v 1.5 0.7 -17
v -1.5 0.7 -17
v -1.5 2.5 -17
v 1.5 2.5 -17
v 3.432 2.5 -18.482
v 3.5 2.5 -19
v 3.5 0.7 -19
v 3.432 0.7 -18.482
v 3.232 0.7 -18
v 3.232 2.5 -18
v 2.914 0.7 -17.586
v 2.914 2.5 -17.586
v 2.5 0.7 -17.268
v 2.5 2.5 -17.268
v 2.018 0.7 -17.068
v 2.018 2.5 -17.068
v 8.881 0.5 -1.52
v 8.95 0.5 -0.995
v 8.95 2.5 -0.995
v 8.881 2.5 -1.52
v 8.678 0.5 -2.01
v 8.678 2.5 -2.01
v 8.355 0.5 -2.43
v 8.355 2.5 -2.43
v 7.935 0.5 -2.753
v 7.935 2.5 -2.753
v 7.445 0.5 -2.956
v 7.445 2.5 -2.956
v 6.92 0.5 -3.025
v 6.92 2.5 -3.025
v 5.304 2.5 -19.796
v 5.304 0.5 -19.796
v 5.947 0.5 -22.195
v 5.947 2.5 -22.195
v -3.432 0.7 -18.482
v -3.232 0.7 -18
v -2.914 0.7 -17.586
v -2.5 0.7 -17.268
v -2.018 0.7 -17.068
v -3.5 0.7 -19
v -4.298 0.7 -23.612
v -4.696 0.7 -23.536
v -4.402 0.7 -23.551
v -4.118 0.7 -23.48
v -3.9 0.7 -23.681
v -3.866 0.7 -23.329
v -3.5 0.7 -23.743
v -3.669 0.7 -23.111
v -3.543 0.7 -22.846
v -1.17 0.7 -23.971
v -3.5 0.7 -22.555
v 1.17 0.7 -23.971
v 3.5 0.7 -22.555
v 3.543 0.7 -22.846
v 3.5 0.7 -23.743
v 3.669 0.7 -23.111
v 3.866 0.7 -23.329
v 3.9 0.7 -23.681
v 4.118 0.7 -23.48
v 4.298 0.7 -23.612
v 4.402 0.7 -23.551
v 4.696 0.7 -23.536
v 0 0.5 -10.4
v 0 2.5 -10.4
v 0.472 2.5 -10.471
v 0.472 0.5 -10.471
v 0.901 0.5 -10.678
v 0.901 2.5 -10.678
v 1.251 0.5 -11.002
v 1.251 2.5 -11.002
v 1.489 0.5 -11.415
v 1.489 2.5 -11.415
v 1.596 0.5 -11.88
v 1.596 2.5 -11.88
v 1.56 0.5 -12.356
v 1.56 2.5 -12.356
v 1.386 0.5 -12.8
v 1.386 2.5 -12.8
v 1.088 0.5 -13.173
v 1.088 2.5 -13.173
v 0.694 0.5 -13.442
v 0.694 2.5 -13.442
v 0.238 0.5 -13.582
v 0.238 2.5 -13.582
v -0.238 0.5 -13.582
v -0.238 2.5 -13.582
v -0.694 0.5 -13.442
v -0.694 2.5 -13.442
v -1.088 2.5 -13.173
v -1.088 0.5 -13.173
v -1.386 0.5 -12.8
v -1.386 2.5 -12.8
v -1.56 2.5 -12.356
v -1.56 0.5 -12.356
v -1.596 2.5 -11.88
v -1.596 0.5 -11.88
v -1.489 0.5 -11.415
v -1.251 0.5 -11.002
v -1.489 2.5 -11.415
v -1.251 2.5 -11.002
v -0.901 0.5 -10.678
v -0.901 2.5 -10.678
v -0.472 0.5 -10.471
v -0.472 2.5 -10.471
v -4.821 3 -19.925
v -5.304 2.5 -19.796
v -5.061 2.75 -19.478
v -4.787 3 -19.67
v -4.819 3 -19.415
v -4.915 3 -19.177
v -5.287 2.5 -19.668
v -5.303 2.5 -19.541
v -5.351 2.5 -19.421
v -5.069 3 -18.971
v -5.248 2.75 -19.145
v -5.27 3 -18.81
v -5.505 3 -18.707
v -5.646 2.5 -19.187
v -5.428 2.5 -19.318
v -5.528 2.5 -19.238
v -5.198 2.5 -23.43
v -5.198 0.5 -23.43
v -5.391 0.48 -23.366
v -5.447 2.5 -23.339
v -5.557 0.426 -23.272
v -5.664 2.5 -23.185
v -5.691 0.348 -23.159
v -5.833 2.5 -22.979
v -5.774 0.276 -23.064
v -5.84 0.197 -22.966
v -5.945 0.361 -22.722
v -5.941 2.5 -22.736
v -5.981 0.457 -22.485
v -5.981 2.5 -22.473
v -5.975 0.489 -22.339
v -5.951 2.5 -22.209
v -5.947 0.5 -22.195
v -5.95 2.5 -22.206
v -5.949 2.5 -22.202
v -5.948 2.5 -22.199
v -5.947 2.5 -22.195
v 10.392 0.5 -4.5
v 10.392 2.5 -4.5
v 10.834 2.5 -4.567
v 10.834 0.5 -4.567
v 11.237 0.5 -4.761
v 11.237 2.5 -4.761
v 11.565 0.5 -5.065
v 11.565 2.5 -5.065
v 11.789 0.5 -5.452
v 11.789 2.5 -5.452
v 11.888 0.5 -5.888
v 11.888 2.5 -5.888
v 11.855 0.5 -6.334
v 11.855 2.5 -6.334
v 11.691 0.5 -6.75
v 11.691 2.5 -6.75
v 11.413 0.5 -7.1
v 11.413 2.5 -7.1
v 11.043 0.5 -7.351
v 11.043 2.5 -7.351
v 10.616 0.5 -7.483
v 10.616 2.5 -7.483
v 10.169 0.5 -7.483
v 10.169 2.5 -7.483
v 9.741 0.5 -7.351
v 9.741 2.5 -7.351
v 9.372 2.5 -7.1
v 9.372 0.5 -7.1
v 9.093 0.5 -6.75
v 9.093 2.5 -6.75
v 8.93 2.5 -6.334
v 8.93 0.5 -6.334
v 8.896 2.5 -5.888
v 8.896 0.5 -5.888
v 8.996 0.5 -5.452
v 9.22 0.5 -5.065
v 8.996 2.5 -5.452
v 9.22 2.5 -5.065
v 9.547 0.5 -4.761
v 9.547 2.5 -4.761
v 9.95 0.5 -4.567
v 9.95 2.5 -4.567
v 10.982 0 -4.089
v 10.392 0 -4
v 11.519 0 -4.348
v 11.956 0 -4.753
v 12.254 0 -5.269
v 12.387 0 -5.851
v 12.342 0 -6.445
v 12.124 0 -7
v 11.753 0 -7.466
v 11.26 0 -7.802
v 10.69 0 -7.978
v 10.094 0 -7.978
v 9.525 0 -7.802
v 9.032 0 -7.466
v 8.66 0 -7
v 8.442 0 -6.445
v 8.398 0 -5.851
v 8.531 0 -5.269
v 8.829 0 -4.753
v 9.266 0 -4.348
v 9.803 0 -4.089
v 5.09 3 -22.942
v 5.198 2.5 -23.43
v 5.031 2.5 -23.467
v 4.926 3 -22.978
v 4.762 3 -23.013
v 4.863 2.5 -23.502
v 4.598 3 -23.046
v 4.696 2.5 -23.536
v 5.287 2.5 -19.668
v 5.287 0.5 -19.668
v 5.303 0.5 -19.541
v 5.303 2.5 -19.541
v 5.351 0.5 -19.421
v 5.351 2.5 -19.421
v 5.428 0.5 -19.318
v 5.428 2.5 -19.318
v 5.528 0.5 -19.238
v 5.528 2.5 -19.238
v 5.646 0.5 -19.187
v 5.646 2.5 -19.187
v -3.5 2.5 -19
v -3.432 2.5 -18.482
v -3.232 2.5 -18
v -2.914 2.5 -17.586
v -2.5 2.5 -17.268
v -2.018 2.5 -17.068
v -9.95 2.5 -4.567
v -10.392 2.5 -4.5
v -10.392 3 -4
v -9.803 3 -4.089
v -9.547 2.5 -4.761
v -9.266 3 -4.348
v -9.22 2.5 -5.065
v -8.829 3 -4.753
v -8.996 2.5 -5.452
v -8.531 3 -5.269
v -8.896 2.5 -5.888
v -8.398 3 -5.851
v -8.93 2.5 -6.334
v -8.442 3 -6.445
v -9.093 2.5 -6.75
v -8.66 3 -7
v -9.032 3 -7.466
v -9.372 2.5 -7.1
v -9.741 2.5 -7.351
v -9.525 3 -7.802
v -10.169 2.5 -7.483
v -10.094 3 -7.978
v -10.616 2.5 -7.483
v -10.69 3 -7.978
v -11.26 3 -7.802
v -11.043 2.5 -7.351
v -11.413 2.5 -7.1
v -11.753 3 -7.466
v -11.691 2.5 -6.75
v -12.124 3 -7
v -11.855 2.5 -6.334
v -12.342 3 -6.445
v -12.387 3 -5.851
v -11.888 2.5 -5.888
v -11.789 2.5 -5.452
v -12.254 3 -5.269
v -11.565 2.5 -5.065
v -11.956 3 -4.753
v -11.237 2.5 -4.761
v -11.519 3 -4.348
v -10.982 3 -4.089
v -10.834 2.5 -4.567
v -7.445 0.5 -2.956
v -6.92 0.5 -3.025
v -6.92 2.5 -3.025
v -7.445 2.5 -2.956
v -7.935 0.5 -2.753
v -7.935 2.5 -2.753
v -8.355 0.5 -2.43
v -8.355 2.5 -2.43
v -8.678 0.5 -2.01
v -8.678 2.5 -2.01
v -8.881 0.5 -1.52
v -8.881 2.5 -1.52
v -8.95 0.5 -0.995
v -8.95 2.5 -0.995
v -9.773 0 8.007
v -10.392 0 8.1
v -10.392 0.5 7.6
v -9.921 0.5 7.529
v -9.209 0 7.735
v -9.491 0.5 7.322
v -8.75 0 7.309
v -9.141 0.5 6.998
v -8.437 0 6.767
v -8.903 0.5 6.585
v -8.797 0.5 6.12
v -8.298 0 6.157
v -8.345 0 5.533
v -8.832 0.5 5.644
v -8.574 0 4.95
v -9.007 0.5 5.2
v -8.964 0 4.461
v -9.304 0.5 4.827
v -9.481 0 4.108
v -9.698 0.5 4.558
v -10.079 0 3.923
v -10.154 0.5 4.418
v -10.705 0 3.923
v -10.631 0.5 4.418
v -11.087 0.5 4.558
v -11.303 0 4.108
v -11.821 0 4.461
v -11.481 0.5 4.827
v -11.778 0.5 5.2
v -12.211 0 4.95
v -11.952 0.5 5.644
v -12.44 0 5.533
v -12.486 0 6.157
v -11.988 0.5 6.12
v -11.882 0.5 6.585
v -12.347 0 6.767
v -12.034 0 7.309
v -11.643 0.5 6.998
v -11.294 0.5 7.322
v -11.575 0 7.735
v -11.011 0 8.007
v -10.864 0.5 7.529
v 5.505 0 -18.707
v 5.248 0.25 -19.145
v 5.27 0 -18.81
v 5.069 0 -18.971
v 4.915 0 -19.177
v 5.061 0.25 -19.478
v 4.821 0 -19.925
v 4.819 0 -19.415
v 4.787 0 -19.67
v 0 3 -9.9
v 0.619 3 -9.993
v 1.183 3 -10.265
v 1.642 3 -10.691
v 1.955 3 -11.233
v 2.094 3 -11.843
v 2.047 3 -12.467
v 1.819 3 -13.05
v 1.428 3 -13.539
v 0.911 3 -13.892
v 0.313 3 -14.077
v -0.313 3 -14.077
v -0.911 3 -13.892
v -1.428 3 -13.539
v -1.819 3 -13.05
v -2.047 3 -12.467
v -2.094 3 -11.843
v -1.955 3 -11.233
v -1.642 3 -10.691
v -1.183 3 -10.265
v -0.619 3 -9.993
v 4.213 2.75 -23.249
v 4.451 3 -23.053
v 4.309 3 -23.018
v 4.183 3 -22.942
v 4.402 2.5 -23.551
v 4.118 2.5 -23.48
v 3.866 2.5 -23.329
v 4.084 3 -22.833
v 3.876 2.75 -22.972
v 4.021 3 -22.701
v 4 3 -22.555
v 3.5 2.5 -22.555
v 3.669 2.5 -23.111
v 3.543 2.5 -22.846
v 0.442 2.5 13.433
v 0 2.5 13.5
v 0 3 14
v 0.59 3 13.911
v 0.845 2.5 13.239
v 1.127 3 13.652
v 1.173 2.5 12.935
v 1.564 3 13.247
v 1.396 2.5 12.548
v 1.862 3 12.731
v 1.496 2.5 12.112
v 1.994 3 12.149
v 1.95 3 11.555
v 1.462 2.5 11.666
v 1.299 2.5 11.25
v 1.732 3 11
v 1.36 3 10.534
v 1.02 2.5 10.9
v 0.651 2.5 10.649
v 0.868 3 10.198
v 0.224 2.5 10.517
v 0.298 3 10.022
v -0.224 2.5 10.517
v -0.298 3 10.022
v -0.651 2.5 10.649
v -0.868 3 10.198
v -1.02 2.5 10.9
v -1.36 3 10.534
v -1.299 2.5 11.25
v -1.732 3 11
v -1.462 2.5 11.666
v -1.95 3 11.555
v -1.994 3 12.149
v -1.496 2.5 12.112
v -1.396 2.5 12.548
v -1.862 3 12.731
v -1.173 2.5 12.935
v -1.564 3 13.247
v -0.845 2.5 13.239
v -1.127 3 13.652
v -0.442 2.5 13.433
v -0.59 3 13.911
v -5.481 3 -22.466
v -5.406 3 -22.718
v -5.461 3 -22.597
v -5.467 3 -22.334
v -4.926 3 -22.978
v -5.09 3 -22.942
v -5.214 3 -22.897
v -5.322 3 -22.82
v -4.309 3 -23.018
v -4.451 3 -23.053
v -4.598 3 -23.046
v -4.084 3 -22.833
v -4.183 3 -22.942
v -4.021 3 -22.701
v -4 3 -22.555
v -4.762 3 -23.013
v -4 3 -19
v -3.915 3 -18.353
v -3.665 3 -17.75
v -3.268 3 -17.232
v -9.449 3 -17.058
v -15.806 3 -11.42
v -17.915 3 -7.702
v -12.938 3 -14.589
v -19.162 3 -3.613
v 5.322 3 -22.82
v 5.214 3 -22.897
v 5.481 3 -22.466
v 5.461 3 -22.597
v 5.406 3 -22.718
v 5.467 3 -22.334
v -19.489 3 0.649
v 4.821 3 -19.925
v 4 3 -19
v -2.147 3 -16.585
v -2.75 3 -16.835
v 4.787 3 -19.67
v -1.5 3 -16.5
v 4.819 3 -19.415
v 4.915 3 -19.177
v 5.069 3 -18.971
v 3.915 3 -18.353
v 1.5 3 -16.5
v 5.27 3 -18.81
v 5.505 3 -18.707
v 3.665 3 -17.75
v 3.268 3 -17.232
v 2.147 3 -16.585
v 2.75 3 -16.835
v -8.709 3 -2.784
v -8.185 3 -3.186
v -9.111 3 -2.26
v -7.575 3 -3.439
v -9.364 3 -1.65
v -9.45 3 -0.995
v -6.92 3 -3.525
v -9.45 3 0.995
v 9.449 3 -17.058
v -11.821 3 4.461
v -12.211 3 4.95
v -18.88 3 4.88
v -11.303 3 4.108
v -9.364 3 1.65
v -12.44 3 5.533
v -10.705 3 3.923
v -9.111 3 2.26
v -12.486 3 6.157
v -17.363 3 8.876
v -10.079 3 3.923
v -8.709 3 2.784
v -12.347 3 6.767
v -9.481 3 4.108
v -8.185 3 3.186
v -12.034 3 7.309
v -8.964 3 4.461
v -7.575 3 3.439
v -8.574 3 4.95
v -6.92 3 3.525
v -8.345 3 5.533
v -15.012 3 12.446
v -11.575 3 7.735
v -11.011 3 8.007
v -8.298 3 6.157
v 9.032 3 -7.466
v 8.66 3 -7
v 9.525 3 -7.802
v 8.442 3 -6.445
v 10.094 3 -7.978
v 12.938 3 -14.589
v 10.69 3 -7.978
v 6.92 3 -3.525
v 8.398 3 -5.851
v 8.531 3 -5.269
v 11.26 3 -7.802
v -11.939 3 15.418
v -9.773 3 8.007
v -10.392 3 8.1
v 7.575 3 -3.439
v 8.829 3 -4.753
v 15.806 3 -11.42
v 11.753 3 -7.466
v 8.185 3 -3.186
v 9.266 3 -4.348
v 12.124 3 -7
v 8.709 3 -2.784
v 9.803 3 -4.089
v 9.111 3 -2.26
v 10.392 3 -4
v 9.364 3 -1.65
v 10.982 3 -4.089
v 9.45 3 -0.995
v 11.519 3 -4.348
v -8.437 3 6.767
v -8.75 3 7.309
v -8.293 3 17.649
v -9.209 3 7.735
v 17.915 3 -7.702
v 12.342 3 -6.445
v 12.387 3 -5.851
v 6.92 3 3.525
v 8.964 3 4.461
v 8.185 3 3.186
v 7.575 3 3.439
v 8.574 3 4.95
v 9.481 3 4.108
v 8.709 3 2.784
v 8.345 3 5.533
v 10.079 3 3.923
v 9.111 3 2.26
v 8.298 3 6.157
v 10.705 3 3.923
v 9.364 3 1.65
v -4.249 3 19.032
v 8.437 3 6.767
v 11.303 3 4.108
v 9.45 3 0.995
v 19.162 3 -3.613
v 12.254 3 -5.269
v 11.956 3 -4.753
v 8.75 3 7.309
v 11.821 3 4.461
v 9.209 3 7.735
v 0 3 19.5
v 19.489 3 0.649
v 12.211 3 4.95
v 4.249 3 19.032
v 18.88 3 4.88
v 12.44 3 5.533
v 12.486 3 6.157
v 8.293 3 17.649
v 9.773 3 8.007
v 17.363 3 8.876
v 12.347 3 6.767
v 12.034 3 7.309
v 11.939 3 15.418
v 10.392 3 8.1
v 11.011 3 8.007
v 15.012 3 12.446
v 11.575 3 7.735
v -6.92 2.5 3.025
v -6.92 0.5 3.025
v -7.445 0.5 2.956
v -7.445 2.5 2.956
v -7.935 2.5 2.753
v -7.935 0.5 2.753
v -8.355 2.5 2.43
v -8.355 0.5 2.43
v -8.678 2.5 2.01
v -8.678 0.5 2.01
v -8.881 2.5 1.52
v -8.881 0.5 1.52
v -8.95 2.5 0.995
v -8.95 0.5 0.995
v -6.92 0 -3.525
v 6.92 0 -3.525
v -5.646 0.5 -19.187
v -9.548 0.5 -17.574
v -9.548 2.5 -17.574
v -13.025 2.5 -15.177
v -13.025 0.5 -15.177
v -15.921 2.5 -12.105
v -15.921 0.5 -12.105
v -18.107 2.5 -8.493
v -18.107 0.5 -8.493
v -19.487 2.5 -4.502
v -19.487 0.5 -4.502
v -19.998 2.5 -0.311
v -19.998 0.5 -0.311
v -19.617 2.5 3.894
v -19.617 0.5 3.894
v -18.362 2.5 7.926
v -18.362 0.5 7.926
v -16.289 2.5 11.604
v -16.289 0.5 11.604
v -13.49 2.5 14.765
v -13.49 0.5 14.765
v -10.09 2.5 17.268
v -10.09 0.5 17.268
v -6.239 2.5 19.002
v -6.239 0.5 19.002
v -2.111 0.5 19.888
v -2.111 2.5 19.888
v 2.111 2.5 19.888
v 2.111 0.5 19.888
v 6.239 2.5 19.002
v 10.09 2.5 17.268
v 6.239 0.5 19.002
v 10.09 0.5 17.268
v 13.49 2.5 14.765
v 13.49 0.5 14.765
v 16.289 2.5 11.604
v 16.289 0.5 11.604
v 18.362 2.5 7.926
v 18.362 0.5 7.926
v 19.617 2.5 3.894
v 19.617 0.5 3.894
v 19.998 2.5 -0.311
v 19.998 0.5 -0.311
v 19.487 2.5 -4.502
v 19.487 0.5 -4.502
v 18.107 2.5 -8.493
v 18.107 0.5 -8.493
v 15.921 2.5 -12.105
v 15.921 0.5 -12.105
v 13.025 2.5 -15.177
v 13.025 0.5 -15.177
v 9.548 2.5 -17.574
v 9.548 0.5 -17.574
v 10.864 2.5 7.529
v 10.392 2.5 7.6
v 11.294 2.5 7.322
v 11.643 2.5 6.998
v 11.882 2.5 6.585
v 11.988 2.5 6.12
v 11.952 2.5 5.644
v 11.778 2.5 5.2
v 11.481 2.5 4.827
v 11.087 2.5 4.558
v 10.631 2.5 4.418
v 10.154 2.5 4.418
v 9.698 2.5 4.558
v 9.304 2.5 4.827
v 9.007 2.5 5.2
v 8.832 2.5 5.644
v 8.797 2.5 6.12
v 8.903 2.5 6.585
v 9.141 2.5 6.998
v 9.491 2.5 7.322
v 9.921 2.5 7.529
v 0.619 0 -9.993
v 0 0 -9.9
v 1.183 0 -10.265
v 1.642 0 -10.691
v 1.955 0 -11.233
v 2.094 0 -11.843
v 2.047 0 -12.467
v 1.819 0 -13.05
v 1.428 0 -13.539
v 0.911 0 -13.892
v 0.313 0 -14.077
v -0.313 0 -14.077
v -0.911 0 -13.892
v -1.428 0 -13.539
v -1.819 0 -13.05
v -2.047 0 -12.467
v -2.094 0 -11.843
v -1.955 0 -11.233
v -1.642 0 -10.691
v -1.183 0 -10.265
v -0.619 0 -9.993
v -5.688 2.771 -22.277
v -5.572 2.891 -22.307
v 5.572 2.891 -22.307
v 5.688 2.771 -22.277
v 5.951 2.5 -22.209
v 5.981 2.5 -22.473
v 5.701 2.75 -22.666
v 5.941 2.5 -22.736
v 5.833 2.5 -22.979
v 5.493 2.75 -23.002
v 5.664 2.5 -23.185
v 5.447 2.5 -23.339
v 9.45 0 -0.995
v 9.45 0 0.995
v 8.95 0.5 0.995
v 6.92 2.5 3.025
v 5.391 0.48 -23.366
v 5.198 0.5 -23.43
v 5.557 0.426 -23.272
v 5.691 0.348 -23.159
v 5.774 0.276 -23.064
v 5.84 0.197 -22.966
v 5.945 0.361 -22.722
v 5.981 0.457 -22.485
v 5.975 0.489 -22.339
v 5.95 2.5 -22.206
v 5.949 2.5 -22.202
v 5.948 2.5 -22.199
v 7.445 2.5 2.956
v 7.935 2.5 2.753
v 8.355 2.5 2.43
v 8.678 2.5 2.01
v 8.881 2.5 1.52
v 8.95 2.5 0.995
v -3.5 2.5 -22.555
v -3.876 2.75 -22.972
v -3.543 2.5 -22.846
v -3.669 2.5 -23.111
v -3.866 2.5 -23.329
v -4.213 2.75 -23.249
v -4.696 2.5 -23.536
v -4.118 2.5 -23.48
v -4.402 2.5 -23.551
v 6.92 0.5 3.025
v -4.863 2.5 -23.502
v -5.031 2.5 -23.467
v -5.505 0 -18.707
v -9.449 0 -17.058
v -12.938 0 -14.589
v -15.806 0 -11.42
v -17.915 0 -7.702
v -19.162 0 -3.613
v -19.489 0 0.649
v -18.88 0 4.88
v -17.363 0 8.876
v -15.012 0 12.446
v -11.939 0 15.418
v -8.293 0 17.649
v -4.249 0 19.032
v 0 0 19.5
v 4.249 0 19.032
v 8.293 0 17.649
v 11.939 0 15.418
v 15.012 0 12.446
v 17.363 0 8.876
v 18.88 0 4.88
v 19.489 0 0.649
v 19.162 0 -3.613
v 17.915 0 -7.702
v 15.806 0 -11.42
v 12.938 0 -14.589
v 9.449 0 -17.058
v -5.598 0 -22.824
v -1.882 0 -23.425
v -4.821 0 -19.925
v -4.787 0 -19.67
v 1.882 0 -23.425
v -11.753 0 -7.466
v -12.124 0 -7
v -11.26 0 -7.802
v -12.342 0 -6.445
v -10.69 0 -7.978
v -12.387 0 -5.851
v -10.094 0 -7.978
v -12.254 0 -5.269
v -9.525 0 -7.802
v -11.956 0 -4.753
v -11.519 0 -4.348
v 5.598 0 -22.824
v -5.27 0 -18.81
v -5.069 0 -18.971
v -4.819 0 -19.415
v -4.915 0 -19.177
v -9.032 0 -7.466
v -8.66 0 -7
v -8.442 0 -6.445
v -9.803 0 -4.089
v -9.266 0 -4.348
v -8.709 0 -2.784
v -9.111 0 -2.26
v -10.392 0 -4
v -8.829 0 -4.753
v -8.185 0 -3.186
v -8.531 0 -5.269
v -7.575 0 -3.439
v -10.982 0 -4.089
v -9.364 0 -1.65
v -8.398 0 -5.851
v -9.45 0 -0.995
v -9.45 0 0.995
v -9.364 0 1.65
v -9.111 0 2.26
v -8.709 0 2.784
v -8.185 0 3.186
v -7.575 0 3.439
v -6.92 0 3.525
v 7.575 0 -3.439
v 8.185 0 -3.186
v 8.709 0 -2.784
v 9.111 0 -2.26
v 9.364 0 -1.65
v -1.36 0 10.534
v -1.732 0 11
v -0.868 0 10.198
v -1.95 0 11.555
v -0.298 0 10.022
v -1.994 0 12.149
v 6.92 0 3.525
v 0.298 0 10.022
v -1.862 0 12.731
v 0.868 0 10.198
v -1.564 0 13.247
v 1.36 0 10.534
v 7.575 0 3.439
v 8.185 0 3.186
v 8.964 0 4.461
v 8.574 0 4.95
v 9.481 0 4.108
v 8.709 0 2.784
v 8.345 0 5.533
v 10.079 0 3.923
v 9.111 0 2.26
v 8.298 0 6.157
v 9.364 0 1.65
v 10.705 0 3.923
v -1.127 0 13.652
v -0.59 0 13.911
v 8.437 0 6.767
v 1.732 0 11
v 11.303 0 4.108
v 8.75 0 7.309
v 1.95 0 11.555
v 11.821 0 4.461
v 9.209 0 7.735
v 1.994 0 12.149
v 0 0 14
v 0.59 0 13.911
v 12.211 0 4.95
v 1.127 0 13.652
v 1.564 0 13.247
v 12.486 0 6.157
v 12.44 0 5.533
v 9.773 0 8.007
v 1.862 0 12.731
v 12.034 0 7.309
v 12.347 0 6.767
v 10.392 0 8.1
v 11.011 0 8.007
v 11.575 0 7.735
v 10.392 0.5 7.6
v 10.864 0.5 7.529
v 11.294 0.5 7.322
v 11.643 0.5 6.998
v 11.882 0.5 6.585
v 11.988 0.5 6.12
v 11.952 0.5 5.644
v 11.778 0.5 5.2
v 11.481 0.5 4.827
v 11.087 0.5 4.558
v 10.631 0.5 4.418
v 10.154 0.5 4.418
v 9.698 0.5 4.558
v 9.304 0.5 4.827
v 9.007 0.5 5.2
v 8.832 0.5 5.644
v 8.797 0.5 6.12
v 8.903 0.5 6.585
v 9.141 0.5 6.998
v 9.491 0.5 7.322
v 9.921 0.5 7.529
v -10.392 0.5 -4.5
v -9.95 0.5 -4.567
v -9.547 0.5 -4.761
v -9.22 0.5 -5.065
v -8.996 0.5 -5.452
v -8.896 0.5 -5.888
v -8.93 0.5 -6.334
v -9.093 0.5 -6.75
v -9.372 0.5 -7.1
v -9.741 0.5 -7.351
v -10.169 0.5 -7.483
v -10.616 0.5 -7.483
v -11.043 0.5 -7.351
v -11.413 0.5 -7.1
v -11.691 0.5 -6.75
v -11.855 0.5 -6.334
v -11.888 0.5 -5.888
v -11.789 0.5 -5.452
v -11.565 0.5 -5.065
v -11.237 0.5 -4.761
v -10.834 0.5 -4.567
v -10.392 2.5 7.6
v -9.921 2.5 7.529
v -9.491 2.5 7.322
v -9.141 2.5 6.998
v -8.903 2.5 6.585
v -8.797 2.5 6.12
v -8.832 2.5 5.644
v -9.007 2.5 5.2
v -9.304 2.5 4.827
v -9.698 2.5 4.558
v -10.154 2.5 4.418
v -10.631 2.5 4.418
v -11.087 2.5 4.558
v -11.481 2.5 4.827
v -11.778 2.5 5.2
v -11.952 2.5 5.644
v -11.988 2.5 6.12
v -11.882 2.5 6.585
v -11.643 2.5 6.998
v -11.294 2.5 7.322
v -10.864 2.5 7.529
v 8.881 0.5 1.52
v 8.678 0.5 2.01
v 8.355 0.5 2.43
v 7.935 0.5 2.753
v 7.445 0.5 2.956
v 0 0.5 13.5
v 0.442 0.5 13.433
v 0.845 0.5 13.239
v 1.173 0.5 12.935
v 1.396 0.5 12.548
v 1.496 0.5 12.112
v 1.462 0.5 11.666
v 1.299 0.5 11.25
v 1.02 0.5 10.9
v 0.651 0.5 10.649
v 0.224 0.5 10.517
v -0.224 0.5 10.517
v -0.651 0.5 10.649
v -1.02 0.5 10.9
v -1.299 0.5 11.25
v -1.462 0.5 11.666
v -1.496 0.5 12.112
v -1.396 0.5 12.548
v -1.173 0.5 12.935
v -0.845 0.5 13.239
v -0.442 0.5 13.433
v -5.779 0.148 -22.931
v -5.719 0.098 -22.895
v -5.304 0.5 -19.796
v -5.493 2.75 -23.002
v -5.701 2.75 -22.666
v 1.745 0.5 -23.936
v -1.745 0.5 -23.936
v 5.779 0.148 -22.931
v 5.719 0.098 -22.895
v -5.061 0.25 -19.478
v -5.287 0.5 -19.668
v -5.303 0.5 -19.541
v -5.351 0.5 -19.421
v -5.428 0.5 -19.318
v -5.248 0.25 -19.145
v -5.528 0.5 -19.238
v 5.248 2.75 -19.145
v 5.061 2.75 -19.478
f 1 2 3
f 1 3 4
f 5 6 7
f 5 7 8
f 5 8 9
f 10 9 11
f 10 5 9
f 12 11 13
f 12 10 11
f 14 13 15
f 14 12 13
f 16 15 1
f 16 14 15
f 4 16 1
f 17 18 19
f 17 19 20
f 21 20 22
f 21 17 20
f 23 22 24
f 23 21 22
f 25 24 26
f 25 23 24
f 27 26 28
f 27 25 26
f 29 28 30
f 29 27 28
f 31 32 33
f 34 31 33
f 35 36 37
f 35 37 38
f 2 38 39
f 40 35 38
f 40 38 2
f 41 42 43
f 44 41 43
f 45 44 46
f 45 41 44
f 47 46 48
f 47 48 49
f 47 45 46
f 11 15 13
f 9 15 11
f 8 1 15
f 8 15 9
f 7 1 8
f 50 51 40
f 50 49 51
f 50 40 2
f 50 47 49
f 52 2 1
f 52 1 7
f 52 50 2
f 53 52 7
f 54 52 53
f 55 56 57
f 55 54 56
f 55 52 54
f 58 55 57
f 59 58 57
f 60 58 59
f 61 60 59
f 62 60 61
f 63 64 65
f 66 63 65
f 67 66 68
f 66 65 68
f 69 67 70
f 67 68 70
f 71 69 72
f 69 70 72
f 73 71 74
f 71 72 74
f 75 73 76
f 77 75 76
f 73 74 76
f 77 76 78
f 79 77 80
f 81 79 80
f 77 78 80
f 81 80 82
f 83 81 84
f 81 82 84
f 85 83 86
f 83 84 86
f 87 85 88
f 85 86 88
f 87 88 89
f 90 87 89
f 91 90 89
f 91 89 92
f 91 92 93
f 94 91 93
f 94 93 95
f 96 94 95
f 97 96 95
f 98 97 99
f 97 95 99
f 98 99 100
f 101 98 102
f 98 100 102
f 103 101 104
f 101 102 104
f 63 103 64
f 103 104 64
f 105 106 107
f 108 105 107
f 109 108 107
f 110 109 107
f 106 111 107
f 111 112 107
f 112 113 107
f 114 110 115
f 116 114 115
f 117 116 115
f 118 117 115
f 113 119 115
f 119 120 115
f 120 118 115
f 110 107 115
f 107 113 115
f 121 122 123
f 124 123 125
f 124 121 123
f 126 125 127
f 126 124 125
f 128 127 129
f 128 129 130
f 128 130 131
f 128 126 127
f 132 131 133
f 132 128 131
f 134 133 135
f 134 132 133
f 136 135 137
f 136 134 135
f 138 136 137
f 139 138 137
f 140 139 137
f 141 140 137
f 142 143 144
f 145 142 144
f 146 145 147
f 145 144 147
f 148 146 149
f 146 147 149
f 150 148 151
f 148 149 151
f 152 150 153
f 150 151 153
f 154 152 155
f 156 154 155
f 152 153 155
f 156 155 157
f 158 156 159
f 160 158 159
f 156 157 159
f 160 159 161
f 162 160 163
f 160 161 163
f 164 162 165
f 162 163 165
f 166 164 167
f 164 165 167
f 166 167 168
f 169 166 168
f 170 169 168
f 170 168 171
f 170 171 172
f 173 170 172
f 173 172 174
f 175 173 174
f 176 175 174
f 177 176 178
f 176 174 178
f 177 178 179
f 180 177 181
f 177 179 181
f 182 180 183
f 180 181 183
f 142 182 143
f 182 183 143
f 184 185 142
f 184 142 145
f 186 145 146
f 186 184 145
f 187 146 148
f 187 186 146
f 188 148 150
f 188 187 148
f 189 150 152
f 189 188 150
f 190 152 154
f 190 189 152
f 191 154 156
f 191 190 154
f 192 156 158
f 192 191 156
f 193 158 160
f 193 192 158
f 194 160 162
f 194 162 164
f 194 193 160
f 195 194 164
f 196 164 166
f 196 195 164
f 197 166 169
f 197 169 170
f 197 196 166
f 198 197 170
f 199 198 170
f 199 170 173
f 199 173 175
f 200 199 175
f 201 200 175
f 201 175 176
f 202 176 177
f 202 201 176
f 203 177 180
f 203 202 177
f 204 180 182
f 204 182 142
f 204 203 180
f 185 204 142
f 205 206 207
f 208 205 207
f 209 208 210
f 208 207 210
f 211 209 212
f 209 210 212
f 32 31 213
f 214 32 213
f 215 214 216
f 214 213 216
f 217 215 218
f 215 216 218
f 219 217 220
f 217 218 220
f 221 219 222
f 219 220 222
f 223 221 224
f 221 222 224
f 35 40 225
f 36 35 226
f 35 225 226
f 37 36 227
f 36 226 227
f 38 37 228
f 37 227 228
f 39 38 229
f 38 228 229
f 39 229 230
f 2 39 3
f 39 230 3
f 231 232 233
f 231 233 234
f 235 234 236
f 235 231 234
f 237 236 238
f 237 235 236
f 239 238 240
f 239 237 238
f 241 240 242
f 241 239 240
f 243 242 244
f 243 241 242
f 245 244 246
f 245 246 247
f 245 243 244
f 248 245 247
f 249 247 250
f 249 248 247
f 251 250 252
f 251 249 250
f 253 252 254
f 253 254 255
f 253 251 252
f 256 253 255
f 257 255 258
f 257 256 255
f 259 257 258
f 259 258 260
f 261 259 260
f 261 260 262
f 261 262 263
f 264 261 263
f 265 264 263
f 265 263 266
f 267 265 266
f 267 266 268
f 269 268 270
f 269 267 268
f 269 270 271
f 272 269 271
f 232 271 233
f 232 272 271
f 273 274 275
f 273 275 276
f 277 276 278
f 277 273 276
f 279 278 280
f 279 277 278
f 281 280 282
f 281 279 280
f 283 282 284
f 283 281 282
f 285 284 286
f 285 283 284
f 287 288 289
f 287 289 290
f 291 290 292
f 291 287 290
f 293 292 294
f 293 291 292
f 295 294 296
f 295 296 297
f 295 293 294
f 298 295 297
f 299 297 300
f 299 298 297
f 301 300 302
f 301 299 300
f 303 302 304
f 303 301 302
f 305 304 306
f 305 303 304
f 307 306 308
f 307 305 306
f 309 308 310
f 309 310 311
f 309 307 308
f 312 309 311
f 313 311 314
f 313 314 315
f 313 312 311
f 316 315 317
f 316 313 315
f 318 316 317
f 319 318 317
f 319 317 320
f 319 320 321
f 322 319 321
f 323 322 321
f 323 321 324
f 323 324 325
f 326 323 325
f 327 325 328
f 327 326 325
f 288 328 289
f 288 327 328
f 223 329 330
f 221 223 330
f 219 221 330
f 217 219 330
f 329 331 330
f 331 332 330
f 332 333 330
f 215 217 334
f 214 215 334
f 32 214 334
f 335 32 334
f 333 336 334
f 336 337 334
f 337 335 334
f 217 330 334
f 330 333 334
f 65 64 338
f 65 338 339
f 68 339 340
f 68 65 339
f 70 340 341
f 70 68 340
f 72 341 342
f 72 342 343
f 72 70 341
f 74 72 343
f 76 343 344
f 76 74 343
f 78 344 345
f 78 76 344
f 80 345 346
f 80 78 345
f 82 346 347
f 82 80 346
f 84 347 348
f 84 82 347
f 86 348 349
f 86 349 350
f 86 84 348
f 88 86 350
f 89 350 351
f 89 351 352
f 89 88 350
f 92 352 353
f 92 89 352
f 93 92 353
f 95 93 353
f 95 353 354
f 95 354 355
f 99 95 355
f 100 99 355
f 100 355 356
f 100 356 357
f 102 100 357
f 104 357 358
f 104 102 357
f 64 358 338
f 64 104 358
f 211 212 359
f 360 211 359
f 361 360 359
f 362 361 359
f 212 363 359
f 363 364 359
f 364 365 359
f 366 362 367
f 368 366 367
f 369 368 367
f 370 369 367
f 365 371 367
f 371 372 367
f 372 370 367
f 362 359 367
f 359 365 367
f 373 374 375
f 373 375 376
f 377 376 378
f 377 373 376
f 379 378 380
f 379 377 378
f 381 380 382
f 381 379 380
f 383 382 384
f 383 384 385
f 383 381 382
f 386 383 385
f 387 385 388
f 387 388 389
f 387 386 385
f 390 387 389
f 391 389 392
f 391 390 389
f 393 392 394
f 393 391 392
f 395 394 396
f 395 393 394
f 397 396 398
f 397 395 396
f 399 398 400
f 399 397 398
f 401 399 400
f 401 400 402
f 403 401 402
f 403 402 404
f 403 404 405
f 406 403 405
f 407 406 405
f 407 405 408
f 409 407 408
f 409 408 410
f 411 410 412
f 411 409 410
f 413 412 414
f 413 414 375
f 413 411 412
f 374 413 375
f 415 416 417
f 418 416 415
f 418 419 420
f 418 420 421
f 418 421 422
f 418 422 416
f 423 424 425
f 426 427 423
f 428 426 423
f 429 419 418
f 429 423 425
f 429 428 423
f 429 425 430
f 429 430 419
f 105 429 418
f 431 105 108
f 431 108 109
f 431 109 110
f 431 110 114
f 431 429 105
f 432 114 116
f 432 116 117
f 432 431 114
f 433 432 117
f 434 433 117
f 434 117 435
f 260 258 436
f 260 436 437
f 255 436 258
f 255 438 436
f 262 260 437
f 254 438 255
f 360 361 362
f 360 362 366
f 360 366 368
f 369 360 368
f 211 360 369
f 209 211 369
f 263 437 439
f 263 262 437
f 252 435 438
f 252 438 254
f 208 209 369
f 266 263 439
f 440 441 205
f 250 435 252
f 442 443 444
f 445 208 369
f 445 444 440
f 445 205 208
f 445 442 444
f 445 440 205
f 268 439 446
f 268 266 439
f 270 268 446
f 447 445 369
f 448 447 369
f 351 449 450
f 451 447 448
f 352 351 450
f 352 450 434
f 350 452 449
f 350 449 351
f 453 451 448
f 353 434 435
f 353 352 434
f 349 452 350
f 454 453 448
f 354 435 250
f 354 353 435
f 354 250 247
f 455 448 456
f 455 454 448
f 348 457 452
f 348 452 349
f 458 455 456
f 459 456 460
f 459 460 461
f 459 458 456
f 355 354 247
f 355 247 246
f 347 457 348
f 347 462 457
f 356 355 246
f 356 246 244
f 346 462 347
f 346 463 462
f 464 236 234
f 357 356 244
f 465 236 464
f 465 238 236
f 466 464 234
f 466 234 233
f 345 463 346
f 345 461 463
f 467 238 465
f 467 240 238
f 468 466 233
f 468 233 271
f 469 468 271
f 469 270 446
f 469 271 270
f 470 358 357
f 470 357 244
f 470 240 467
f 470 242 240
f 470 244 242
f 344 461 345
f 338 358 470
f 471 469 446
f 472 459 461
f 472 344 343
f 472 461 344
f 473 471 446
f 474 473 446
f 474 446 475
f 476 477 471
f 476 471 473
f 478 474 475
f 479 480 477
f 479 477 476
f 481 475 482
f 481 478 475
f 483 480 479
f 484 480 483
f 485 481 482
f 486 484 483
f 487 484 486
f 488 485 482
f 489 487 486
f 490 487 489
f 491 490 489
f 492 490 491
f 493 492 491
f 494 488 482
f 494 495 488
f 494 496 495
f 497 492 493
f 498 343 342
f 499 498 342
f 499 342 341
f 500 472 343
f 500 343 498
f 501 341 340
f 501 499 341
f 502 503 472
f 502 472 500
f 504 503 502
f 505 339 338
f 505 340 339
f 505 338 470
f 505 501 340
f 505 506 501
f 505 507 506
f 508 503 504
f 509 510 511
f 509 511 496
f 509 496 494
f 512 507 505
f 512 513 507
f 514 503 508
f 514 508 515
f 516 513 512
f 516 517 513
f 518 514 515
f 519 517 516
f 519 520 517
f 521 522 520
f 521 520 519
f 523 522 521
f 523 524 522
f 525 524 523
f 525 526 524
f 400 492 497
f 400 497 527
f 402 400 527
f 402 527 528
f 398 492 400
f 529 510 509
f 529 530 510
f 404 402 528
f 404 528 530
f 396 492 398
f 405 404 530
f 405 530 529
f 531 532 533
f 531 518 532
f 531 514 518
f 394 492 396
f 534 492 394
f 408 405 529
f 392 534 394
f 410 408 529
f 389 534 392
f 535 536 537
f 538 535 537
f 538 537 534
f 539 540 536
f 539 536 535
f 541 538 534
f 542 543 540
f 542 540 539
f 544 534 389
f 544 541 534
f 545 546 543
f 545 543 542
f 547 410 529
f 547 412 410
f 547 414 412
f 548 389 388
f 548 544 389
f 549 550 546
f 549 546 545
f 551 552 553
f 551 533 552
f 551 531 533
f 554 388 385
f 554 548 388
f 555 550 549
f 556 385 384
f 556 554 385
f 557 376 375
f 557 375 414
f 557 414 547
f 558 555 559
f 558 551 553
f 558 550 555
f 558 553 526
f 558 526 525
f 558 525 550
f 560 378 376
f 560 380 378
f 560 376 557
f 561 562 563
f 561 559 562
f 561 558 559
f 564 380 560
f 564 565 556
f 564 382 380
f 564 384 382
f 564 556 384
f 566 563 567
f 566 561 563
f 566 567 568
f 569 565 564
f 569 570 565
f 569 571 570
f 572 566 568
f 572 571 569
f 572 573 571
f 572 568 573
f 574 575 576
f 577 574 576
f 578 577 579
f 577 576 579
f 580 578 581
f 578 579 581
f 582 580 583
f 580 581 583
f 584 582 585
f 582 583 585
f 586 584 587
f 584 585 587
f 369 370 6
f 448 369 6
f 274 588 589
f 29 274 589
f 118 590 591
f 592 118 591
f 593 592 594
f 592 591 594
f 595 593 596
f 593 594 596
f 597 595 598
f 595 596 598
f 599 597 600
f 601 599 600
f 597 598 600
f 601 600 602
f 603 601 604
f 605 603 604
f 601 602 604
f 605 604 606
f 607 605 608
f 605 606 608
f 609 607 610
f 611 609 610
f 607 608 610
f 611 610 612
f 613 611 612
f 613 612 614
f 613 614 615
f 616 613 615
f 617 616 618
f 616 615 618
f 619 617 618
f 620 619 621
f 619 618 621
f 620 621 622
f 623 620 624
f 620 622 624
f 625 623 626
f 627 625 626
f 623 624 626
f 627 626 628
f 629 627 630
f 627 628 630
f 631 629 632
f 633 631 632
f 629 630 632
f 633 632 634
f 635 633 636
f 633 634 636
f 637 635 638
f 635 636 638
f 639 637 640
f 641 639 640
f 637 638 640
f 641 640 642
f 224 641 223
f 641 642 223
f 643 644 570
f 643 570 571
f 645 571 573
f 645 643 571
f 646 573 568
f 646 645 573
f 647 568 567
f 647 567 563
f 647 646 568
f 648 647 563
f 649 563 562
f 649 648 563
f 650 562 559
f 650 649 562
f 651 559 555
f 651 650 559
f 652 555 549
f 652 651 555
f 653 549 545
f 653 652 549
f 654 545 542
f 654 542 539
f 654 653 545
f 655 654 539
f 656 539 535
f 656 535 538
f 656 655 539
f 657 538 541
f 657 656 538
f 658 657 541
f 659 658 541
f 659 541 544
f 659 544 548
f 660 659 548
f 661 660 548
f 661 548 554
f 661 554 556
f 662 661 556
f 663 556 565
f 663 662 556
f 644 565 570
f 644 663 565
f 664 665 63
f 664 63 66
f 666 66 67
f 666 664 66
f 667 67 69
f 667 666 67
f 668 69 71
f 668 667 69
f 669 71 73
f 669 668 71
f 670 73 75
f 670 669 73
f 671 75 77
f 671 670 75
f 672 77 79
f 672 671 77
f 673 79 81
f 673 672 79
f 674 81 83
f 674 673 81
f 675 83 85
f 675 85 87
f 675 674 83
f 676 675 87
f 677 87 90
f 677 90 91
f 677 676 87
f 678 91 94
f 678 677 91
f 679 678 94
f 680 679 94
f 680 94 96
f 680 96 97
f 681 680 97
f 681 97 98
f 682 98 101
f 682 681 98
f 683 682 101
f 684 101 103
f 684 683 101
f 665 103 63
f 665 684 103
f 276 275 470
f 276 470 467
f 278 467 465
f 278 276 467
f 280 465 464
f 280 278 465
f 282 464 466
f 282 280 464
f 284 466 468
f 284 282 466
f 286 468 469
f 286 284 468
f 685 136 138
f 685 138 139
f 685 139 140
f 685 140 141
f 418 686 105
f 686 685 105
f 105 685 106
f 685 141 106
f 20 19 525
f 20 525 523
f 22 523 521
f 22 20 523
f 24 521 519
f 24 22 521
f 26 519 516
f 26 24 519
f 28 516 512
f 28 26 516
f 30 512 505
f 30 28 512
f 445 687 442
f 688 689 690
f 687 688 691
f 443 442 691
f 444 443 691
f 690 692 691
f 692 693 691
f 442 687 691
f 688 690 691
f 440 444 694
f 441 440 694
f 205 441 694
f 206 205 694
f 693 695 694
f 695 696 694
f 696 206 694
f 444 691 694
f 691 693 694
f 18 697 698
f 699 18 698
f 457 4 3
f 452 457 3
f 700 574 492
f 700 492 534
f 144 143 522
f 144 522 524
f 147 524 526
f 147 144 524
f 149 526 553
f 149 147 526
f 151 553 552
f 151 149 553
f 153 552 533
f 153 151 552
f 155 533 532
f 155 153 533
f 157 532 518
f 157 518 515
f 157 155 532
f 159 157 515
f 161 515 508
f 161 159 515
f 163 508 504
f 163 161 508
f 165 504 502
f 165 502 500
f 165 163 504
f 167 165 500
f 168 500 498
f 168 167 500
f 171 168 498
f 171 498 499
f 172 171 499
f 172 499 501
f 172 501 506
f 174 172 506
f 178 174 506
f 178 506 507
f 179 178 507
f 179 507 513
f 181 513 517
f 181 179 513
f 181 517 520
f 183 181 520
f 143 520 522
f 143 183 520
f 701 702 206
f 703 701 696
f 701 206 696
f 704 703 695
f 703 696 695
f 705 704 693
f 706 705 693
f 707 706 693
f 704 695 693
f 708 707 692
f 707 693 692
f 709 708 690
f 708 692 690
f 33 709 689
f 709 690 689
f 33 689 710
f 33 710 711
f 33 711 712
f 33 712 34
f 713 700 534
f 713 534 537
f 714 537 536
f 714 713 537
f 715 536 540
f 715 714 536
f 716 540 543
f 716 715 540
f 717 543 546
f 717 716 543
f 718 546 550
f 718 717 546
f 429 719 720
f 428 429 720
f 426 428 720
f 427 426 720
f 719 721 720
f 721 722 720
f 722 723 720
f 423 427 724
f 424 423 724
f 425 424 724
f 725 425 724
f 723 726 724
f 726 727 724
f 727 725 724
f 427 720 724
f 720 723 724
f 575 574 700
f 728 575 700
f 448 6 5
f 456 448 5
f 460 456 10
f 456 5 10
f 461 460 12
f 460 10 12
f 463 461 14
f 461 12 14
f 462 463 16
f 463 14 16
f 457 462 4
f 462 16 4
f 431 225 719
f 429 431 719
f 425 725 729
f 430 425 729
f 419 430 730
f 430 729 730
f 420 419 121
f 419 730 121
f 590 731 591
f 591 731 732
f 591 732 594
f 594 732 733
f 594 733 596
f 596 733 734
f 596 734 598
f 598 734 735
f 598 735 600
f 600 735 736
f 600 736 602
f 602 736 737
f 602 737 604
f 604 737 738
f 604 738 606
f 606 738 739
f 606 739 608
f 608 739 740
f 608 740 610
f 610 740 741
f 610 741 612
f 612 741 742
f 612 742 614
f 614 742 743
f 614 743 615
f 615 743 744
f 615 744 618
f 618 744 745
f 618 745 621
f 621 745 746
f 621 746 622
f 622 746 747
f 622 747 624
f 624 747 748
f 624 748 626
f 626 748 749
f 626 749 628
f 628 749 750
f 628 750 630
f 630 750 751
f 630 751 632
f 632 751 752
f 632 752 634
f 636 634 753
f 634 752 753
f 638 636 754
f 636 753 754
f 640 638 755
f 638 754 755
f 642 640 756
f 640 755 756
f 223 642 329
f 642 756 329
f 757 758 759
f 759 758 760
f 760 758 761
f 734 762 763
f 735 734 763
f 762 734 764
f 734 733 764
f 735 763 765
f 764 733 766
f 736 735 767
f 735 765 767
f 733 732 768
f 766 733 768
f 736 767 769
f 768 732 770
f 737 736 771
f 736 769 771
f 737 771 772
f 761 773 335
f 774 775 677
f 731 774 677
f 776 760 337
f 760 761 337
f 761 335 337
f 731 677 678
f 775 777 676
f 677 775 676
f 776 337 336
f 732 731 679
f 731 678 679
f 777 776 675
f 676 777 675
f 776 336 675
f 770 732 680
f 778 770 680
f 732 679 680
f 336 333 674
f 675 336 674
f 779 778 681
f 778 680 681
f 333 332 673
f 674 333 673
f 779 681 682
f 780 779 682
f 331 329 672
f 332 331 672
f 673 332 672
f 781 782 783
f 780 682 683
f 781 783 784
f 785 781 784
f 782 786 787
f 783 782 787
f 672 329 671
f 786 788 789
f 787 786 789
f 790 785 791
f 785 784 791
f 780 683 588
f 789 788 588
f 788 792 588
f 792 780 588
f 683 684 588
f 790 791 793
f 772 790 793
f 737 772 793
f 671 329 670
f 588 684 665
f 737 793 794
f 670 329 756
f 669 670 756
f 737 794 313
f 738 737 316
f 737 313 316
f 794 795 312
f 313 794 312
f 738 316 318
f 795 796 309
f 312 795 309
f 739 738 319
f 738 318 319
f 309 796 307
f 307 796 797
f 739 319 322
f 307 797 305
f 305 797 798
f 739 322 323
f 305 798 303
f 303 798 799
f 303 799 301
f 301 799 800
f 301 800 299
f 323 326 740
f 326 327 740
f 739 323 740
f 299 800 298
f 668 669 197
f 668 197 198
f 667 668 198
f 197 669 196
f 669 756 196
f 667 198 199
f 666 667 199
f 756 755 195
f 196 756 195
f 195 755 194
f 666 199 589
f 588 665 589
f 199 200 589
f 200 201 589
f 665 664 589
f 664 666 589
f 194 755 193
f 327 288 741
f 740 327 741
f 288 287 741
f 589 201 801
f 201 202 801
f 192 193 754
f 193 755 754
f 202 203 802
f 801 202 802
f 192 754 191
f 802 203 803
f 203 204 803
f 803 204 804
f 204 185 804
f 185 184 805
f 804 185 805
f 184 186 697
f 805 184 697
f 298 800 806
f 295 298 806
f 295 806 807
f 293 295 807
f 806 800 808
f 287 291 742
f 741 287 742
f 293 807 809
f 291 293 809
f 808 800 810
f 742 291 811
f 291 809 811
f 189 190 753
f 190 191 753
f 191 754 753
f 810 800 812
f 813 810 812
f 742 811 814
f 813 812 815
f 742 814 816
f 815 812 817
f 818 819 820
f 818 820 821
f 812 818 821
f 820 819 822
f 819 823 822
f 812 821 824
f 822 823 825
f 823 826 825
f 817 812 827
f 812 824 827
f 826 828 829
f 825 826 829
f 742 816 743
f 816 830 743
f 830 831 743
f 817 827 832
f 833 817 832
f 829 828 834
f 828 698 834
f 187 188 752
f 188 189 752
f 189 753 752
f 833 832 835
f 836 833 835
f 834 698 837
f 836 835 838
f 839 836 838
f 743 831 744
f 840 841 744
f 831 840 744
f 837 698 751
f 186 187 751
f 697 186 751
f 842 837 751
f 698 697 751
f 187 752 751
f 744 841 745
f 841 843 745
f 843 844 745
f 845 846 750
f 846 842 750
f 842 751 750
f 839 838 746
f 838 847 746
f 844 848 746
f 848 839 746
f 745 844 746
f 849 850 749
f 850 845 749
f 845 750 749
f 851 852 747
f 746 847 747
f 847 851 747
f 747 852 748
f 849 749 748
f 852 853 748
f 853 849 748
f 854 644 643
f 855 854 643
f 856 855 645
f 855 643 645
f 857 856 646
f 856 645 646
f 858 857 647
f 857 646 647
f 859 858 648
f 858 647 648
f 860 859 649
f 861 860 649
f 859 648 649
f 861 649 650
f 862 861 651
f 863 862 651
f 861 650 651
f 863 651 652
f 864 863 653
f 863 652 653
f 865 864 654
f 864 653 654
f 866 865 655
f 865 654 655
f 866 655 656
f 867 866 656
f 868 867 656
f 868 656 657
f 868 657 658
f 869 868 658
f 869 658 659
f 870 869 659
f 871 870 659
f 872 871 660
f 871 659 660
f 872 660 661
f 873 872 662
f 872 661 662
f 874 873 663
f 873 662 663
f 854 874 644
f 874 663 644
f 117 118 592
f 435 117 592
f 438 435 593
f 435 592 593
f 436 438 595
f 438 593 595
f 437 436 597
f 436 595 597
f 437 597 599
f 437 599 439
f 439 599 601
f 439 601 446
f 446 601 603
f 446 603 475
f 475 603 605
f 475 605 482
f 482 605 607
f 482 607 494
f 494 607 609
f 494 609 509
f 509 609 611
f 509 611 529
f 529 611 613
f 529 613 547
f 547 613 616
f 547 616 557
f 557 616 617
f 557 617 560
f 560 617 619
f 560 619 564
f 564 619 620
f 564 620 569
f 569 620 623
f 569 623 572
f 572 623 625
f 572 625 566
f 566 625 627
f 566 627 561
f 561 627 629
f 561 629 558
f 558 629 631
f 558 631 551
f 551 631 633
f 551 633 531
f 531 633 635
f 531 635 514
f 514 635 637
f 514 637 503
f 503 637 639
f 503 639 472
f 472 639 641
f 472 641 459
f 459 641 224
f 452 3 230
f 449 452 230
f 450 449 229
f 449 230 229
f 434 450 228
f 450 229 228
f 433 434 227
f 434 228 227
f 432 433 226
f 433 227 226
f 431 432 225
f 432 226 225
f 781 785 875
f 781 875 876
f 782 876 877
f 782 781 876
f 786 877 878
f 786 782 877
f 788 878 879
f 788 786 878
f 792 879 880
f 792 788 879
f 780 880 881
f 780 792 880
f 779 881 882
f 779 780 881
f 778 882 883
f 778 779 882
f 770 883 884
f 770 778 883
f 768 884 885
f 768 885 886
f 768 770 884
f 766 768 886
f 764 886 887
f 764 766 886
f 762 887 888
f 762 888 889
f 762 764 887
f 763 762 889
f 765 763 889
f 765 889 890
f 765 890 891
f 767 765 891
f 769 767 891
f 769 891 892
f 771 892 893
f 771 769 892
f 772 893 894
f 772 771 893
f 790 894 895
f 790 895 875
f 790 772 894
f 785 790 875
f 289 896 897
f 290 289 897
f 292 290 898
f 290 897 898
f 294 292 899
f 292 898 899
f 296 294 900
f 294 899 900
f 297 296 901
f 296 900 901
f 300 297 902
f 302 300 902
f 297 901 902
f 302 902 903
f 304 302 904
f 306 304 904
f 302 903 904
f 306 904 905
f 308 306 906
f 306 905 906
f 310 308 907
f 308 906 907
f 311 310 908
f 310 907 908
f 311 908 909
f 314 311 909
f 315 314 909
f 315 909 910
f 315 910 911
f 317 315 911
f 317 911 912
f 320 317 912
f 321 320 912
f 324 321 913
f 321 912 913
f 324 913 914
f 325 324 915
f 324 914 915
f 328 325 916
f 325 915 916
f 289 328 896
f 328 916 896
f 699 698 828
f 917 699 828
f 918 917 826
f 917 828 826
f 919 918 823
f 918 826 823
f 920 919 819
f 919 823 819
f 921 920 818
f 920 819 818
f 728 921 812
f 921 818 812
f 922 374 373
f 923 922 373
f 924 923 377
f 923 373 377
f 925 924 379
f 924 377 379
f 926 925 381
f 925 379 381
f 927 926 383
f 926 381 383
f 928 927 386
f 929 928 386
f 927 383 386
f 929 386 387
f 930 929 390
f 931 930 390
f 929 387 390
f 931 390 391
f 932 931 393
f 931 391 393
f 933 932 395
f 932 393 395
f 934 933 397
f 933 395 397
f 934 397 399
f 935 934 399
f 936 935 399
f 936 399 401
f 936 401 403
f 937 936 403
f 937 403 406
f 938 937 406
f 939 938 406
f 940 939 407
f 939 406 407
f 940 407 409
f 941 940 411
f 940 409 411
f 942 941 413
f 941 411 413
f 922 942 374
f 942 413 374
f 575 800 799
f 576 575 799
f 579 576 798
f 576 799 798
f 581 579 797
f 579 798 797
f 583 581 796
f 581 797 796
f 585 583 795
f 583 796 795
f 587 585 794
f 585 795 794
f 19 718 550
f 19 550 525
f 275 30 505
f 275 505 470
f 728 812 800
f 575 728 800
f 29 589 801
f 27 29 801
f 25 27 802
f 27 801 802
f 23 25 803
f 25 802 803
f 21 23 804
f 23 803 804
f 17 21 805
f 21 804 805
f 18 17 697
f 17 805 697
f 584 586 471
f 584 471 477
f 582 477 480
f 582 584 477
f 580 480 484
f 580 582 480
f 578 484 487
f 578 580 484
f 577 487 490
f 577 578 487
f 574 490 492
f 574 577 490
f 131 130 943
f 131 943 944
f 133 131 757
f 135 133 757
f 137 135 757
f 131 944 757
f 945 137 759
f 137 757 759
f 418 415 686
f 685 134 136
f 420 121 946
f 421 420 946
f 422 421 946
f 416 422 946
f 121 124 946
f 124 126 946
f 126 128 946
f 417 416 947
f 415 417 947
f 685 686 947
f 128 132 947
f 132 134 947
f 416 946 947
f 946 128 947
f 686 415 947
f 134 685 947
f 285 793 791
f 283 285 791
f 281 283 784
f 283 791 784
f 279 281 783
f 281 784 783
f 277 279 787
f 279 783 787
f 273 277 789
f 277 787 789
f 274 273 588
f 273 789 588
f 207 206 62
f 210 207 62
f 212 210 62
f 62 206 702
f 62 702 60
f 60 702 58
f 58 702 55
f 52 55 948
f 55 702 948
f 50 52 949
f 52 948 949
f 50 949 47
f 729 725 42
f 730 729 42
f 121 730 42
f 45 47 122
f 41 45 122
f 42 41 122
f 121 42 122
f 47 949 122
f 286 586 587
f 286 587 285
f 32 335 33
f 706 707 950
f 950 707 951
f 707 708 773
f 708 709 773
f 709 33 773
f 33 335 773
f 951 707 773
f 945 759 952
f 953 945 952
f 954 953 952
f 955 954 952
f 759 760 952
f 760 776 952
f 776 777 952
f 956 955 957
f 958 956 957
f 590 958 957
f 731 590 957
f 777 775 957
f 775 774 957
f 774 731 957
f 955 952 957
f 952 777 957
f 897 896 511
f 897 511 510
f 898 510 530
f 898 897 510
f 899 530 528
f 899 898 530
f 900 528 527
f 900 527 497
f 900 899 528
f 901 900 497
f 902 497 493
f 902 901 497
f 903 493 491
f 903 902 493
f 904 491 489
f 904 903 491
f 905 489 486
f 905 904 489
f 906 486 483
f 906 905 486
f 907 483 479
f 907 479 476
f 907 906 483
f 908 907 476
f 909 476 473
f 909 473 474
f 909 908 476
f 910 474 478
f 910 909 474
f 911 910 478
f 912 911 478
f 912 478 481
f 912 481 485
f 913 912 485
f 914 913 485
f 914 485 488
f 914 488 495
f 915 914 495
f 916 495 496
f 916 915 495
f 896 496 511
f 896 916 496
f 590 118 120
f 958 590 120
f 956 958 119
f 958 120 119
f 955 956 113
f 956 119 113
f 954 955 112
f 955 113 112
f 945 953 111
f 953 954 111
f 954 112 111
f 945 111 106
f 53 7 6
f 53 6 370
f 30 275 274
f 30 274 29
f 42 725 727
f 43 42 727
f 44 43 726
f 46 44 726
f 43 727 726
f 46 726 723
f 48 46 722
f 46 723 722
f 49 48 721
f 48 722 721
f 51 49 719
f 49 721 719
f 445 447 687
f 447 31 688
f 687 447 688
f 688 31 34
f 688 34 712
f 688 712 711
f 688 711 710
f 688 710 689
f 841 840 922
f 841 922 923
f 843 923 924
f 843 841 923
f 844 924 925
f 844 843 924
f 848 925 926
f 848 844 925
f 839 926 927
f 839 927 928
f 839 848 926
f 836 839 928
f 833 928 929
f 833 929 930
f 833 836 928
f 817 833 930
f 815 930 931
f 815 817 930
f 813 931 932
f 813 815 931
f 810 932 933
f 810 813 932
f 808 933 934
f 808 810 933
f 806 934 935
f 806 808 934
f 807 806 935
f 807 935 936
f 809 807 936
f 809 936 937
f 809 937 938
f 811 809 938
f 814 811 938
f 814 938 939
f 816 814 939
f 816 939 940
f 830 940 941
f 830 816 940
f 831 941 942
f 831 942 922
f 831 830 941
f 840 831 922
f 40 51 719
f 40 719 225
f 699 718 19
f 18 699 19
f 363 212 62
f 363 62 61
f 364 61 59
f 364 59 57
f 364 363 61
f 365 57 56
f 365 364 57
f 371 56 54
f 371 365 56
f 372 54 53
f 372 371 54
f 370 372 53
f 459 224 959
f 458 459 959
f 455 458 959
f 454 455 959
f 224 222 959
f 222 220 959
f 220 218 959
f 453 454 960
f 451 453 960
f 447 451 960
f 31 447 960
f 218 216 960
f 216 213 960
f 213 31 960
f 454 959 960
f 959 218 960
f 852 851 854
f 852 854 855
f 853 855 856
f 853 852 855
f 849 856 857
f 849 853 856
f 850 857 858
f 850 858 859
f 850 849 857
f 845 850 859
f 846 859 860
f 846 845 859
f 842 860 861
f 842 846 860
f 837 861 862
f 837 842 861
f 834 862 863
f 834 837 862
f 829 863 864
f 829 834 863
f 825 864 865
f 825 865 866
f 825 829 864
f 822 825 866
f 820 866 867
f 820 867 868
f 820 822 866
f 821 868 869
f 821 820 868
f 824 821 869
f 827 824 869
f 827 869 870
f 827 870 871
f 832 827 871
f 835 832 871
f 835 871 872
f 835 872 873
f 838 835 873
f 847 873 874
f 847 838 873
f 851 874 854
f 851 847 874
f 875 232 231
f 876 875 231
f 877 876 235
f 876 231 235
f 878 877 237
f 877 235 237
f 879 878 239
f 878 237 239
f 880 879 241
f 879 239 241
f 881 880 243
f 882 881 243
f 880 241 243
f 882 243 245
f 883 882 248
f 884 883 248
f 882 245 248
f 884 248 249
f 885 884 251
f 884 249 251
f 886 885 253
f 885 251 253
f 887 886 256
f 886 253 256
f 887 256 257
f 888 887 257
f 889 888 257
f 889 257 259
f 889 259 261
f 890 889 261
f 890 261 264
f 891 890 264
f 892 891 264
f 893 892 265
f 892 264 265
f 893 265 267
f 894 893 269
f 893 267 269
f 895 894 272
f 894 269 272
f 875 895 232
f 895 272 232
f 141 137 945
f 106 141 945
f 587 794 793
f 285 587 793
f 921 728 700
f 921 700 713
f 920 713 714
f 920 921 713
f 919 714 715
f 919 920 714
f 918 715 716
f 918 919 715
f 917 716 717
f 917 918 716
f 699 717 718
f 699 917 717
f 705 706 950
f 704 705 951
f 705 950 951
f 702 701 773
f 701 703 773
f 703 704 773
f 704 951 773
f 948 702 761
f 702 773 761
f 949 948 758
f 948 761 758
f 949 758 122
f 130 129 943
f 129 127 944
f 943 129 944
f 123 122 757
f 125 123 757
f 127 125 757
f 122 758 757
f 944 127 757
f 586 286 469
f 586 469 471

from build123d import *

# Parameters (mm, degrees)
SKETCH_1_R          = 25
EXTRUDE_1_DEPTH     = 3
SKETCH_2_R          = 1.6
SKETCH_2_R_2        = 1.5
CUT_EXTRUDE_1_DEPTH = 3
CUT_EXTRUDE_START   = -3
SKETCH_3_R          = 25
CUT_EXTRUDE_2_DEPTH = 3
FILLET_1_R          = 0.5
SKETCH_4_W          = 17.9
SKETCH_4_H          = 6.05
CUT_EXTRUDE_3_DEPTH = 10
FILLET_3_R          = 2.03
CUT_EXTRUDE_START_2 = -2.3
CUT_EXTRUDE_5_DEPTH = 2.3
FILLET_4_R          = 2
CHAMFER_1_SIZE      = 0.5
FILLET_7_R          = 1
CHAMFER_3_SIZE      = 0.5


with BuildPart() as part:
    # 草图1 → 凸台-拉伸1 (new body)
    with BuildSketch(Plane(origin=(0, 0, 0), x_dir=(1, 0, 0), z_dir=(0, 1, 0))):
        with Locations(Location((0, 0, 0), (0, 0, 270))):
            Circle(SKETCH_1_R)
    extrude(amount=EXTRUDE_1_DEPTH)

    # 草图2 → 切除-拉伸1 (cut)
    with BuildSketch(Plane(origin=(0, 3, 0), x_dir=(1, 0, 0), z_dir=(0, 1, 0))):
        with Locations(Location((10.392304845, -6, 0), (0, 0, 270))):
            Circle(SKETCH_2_R)
        with Locations(Location((-10.392304845, -6, 0), (0, 0, 270))):
            Circle(SKETCH_2_R)
        with Locations(Location((0, 12, 0), (0, 0, 270))):
            Circle(SKETCH_2_R)
        with Locations(Location((0, -12, 0), (0, 0, 270))):
            Circle(SKETCH_2_R_2)
        with Locations(Location((-10.392304845, 6, 0), (0, 0, 270))):
            Circle(SKETCH_2_R_2)
        with Locations(Location((10.392304845, 6, 0), (0, 0, 270))):
            Circle(SKETCH_2_R_2)
    extrude(amount=-CUT_EXTRUDE_1_DEPTH, mode=Mode.SUBTRACT)

    # 草图3 → 切除-拉伸2 (cut)
    with BuildSketch(Plane(origin=(0, 3, 0), x_dir=(1, 0, 0), z_dir=(0, 1, 0)).offset(CUT_EXTRUDE_START)):
        Circle(SKETCH_3_R)
        with BuildLine():
            Line((-6.211657082, 23.182219831), (-5.176380902, 19.318516526))
            ThreePointArc((-5.176380902, 19.318516526), (0, -20), (5.176380902, 19.318516526))
            Line((5.176380902, 19.318516526), (6.211657082, 23.182219831))
            ThreePointArc((6.211657082, 23.182219831), (0, 24), (-6.211657082, 23.182219831))
        make_face(mode=Mode.SUBTRACT)
    extrude(amount=CUT_EXTRUDE_2_DEPTH, mode=Mode.SUBTRACT)

    # 圆角1
    fillet_1_edges = [part.edges().sort_by_distance(p)[0] for p in [
        (5.176380902, 1.5, -19.318516526),
        (-5.176380902, 1.5, -19.318516526),
    ]]
    fillet(fillet_1_edges, radius=FILLET_1_R)

    # 草图4 → 切除-拉伸3 (cut)
    with BuildSketch(Plane(origin=(0, 3, 0), x_dir=(1, 0, 0), z_dir=(0, 1, 0))):
        Rectangle(SKETCH_4_W, SKETCH_4_H)
    extrude(amount=-CUT_EXTRUDE_3_DEPTH, mode=Mode.SUBTRACT)

    # 圆角3
    fillet_3_edges = [part.edges().sort_by_distance(p)[0] for p in [
        (8.95, 1.5, -3.025),
        (8.95, 1.5, 3.025),
        (-8.95, 1.5, 3.025),
        (-8.95, 1.5, -3.025),
    ]]
    fillet(fillet_3_edges, radius=FILLET_3_R)

    # 草图5 → 切除-拉伸5 (cut)
    with BuildSketch(Plane(origin=(0, 3, 0), x_dir=(1, 0, 0), z_dir=(0, 1, 0)).offset(CUT_EXTRUDE_START_2)):
        with BuildLine():
            Line((-3.5, 23.743420141), (-3.5, 17))
            Line((-3.5, 17), (3.5, 17))
            Line((3.5, 17), (3.5, 23.743420141))
            ThreePointArc((3.5, 23.743420141), (0, 24), (-3.5, 23.743420141))
        make_face()
    extrude(amount=CUT_EXTRUDE_5_DEPTH, mode=Mode.SUBTRACT)

    # 圆角4
    fillet_4_edges = [part.edges().sort_by_distance(p)[0] for p in [
        (-3.5, 1.85, -17),
        (3.5, 1.85, -17),
    ]]
    fillet(fillet_4_edges, radius=FILLET_4_R)

    # 倒角1
    chamfer_1_edges = [part.edges().sort_by_distance(p)[0] for p in [
        (-8.355426766, 0, 2.430426766),
        (-8.355426766, 3, -2.430426766),
        (-8.355426766, 0, -2.430426766),
        (0, 0, 10.5),
        (0, 3, 10.5),
        (-10.392304845, 0, 4.4),
        (-10.392304845, 3, 4.4),
        (10.392304845, 0, -7.5),
        (10.392304845, 3, -7.5),
        (-10.392304845, 0, -7.5),
        (-10.392304845, 3, -7.5),
        (10.392304845, 0, 4.4),
        (10.392304845, 3, 4.4),
        (0, 0, -13.6),
        (0, 3, -13.6),
        (0, 0, -24),
        (-5.757934554, 0, -21.488904301),
        (-5.757934554, 3, -21.488904301),
        (0, 3, 20),
        (0, 0, 20),
        (5.757934554, 3, -21.488904301),
        (5.757934554, 0, -21.488904301),
        (5.351145434, 3, -19.421478878),
        (5.351145434, 0, -19.421478878),
        (-5.351145434, 3, -19.421478878),
        (-5.351145434, 0, -19.421478878),
        (8.95, 3, 0),
        (8.95, 0, 0),
        (0, 3, 3.025),
        (0, 0, 3.025),
        (0, 3, -3.025),
        (0, 0, -3.025),
        (-8.95, 3, 0),
        (-8.95, 0, 0),
        (8.355426766, 3, 2.430426766),
        (8.355426766, 0, 2.430426766),
        (8.355426766, 3, -2.430426766),
        (8.355426766, 0, -2.430426766),
        (-8.355426766, 3, 2.430426766),
    ]]
    chamfer(chamfer_1_edges, length=CHAMFER_1_SIZE)

    # 圆角7
    fillet_7_edges = [part.edges().sort_by_distance(p)[0] for p in [
        (-3.5, 1.85, -23.743420141),
        (3.5, 1.85, -23.743420141),
        (-6.211657082, 1.5, -23.182219831),
        (6.211657082, 1.5, -23.182219831),
    ]]
    fillet(fillet_7_edges, radius=FILLET_7_R)

    # 倒角3
    chamfer_3_edges = [part.edges().sort_by_distance(p)[0] for p in [
        (4.947039166, 3, -23.484607799),
        (3.865828168, 3, -23.328679278),
        (3.5, 3, -20.777743569),
        (2.914213562, 3, -17.585786438),
        (0, 3, -17),
        (-2.914213562, 3, -17.585786438),
        (-3.5, 3, -20.777743569),
        (-4.947039166, 3, -23.484607799),
        (-3.865828168, 3, -23.328679278),
        (5.46233374, 3, -23.33079751),
        (-5.46233374, 3, -23.33079751),
    ]]
    chamfer(chamfer_3_edges, length=CHAMFER_3_SIZE - 0.0001)  # a hair under: the kernel refuses the full size


solid = part.part
